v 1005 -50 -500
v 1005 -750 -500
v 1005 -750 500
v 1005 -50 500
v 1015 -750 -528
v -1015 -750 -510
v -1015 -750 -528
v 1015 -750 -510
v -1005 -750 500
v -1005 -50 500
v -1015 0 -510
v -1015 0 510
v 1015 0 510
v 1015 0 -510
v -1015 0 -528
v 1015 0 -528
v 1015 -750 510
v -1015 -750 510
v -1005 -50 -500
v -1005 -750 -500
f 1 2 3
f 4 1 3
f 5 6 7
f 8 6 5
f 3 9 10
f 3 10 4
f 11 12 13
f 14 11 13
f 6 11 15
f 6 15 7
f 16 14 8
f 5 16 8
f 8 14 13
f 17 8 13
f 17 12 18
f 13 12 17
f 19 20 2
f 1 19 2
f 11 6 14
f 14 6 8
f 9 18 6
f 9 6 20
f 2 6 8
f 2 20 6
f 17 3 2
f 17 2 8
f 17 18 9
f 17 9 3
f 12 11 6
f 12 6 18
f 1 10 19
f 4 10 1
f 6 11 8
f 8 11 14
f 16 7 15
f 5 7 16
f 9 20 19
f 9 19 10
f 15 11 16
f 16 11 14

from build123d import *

# Parameters (mm, degrees)
F0_W     = 2030
F0_H     = 1020
F1_DEPTH = 750
F2_W     = 2010
F2_H     = 1000
F3_DEPTH = 700
F4_W     = 2030
F4_H     = 750
F5_DEPTH = 18


with BuildPart() as f1:
    # F0 (on Front) → F1 (new body)
    with BuildSketch(Plane.XZ):
        Rectangle(F0_W, F0_H)
    extrude(amount=F1_DEPTH)

    # F2 (on face) → F3 (cut)
    with BuildSketch(Plane.XZ.offset(750)):
        Rectangle(F2_W, F2_H)
    extrude(amount=-F3_DEPTH, mode=Mode.SUBTRACT)


with BuildPart() as f5:
    # F4 (on face) → F5 (new body)
    with BuildSketch(Plane(origin=(0, 0, -510), x_dir=(1, 0, 0), z_dir=(0, 0, -1))):
        with Locations((0, 375)):
            Rectangle(F4_W, F4_H)
    extrude(amount=F5_DEPTH)


solid = Compound([f1.part, f5.part])
